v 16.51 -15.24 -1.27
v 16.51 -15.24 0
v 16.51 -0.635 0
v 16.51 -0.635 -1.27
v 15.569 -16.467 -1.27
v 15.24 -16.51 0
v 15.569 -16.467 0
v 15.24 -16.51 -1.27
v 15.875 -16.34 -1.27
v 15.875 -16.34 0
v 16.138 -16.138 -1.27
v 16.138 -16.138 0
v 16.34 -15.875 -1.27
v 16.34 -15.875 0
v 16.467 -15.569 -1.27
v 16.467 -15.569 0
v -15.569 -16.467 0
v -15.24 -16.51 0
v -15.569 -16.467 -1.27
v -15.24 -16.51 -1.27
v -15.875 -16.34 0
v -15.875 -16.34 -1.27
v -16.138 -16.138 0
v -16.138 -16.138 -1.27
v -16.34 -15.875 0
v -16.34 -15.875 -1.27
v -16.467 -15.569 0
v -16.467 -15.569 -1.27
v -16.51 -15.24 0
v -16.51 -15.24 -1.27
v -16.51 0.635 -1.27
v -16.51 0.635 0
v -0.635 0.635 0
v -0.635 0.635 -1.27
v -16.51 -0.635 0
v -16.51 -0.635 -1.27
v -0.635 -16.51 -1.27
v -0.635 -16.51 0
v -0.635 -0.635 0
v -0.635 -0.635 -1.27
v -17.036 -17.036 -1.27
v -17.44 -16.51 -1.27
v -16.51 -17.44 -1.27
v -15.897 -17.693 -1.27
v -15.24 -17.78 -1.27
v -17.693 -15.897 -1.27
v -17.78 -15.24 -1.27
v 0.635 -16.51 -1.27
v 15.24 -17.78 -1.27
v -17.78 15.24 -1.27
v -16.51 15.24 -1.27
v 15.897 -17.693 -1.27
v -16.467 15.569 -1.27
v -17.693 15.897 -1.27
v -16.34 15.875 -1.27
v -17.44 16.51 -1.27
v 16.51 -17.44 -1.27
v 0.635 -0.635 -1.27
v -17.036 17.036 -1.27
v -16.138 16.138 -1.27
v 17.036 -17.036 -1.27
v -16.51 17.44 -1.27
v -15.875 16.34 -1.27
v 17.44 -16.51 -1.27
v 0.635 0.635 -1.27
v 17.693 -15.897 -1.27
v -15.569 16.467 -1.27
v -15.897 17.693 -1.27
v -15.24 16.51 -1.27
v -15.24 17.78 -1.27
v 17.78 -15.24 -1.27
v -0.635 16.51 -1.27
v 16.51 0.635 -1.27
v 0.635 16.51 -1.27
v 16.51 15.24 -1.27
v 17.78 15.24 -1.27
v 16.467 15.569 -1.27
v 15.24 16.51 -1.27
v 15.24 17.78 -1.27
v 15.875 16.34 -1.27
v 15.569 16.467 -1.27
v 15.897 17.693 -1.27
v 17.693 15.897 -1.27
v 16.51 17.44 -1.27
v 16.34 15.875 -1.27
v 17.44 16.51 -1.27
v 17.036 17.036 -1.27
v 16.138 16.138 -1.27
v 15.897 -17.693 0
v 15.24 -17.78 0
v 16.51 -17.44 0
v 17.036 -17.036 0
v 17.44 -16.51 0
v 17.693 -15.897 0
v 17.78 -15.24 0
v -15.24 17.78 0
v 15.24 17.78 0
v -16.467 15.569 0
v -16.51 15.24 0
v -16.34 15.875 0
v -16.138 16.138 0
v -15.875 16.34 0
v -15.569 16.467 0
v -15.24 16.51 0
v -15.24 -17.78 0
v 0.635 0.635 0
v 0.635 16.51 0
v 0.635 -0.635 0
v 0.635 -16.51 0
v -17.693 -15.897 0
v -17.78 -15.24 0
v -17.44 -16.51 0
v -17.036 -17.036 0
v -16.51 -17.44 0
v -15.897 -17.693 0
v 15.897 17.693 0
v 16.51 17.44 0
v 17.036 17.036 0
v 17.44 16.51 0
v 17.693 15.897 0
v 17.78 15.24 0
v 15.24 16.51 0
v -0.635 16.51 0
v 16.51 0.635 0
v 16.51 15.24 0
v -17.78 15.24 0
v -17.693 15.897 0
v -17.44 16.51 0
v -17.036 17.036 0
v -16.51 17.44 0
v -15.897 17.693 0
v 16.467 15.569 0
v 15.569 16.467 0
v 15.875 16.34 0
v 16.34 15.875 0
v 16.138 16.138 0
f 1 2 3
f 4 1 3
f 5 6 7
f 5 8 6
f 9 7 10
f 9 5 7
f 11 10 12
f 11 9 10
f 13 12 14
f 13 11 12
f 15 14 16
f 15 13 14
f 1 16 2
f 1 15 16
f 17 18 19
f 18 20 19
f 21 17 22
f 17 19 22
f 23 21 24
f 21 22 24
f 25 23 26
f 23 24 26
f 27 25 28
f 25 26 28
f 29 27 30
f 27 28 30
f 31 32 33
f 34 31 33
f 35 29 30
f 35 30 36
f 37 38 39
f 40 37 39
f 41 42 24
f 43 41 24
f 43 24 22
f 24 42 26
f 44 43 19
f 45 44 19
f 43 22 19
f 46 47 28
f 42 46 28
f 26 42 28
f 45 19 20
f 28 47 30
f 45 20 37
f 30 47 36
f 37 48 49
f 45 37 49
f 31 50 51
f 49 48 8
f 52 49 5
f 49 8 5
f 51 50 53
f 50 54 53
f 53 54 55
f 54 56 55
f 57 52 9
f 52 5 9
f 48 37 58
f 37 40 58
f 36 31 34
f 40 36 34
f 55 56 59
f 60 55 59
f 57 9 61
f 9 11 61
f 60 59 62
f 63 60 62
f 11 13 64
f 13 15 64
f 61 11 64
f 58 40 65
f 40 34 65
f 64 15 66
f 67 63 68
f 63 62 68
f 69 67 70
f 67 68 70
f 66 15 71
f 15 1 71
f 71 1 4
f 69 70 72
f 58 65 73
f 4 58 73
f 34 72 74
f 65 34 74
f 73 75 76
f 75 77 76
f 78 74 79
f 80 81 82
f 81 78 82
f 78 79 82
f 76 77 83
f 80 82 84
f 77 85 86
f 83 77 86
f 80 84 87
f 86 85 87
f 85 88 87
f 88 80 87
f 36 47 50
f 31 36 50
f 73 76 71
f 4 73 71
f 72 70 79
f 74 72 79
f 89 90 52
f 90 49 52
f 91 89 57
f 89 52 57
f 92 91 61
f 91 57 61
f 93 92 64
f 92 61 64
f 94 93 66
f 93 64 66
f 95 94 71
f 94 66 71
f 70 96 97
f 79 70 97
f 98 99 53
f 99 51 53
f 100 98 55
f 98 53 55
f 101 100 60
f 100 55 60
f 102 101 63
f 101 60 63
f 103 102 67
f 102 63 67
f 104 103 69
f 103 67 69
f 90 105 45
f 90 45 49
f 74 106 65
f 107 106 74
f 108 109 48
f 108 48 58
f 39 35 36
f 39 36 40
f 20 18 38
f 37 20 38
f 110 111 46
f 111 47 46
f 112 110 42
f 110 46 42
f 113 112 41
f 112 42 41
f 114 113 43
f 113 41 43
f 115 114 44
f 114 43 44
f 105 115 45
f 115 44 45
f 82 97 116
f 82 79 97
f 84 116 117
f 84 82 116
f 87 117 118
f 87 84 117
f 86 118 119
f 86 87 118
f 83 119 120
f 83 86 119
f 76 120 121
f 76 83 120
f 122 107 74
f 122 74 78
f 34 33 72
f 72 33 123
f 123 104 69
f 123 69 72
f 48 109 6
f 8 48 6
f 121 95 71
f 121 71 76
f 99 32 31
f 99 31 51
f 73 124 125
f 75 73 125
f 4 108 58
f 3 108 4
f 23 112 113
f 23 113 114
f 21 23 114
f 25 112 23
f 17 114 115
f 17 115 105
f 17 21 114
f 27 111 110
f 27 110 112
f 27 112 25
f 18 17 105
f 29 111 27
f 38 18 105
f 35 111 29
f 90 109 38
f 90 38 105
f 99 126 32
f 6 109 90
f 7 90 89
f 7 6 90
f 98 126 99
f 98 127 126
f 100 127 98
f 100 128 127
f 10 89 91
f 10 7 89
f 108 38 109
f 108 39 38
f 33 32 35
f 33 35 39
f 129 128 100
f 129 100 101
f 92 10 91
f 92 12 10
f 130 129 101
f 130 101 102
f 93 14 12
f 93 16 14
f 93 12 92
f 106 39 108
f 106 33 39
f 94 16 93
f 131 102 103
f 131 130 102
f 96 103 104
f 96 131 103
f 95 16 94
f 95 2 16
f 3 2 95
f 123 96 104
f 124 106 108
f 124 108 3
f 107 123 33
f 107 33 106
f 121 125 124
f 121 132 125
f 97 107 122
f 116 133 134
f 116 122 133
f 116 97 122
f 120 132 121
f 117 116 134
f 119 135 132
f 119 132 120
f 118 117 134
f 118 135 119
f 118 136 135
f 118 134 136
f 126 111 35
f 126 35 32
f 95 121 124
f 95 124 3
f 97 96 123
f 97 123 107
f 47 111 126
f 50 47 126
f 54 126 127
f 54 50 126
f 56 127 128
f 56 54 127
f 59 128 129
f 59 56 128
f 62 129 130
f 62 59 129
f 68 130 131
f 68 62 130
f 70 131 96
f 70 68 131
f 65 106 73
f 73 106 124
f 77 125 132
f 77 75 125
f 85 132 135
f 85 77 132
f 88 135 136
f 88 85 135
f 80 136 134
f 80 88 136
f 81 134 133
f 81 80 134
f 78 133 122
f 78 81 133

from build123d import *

# Parameters (mm, degrees)
F0_W     = 35.56
F0_H     = 35.56
F0_W_2   = 15.875
F0_H_2   = 15.875
F1_DEPTH = 1.27
F2_R     = 2.54
F3_R     = 1.27


with BuildPart() as f1:
    # F0 (on Top) → F1 (new body)
    with BuildSketch(Plane.XY):
        Rectangle(F0_W, F0_H)
        with Locations((-8.5725, -8.5725)):
            Rectangle(F0_W_2, F0_H_2, mode=Mode.SUBTRACT)
        with Locations((8.5725, -8.5725)):
            Rectangle(F0_W_2, F0_H_2, mode=Mode.SUBTRACT)
        with Locations((-8.5725, 8.5725)):
            Rectangle(F0_W_2, F0_H_2, mode=Mode.SUBTRACT)
        with Locations((8.5725, 8.5725)):
            Rectangle(F0_W_2, F0_H_2, mode=Mode.SUBTRACT)
    extrude(amount=-F1_DEPTH)

    # F2
    f2_edges = [f1.edges().sort_by_distance(p)[0] for p in [
        (-17.78, -17.78, -0.635),
        (17.78, -17.78, -0.635),
        (17.78, 17.78, -0.635),
        (-17.78, 17.78, -0.635),
    ]]
    fillet(f2_edges, radius=F2_R)

    # F3
    f3_edges = [f1.edges().sort_by_distance(p)[0] for p in [
        (-16.51, 16.51, -0.635),
        (16.51, 16.51, -0.635),
        (16.51, -16.51, -0.635),
        (-16.51, -16.51, -0.635),
    ]]
    fillet(f3_edges, radius=F3_R)


solid = f1.part
